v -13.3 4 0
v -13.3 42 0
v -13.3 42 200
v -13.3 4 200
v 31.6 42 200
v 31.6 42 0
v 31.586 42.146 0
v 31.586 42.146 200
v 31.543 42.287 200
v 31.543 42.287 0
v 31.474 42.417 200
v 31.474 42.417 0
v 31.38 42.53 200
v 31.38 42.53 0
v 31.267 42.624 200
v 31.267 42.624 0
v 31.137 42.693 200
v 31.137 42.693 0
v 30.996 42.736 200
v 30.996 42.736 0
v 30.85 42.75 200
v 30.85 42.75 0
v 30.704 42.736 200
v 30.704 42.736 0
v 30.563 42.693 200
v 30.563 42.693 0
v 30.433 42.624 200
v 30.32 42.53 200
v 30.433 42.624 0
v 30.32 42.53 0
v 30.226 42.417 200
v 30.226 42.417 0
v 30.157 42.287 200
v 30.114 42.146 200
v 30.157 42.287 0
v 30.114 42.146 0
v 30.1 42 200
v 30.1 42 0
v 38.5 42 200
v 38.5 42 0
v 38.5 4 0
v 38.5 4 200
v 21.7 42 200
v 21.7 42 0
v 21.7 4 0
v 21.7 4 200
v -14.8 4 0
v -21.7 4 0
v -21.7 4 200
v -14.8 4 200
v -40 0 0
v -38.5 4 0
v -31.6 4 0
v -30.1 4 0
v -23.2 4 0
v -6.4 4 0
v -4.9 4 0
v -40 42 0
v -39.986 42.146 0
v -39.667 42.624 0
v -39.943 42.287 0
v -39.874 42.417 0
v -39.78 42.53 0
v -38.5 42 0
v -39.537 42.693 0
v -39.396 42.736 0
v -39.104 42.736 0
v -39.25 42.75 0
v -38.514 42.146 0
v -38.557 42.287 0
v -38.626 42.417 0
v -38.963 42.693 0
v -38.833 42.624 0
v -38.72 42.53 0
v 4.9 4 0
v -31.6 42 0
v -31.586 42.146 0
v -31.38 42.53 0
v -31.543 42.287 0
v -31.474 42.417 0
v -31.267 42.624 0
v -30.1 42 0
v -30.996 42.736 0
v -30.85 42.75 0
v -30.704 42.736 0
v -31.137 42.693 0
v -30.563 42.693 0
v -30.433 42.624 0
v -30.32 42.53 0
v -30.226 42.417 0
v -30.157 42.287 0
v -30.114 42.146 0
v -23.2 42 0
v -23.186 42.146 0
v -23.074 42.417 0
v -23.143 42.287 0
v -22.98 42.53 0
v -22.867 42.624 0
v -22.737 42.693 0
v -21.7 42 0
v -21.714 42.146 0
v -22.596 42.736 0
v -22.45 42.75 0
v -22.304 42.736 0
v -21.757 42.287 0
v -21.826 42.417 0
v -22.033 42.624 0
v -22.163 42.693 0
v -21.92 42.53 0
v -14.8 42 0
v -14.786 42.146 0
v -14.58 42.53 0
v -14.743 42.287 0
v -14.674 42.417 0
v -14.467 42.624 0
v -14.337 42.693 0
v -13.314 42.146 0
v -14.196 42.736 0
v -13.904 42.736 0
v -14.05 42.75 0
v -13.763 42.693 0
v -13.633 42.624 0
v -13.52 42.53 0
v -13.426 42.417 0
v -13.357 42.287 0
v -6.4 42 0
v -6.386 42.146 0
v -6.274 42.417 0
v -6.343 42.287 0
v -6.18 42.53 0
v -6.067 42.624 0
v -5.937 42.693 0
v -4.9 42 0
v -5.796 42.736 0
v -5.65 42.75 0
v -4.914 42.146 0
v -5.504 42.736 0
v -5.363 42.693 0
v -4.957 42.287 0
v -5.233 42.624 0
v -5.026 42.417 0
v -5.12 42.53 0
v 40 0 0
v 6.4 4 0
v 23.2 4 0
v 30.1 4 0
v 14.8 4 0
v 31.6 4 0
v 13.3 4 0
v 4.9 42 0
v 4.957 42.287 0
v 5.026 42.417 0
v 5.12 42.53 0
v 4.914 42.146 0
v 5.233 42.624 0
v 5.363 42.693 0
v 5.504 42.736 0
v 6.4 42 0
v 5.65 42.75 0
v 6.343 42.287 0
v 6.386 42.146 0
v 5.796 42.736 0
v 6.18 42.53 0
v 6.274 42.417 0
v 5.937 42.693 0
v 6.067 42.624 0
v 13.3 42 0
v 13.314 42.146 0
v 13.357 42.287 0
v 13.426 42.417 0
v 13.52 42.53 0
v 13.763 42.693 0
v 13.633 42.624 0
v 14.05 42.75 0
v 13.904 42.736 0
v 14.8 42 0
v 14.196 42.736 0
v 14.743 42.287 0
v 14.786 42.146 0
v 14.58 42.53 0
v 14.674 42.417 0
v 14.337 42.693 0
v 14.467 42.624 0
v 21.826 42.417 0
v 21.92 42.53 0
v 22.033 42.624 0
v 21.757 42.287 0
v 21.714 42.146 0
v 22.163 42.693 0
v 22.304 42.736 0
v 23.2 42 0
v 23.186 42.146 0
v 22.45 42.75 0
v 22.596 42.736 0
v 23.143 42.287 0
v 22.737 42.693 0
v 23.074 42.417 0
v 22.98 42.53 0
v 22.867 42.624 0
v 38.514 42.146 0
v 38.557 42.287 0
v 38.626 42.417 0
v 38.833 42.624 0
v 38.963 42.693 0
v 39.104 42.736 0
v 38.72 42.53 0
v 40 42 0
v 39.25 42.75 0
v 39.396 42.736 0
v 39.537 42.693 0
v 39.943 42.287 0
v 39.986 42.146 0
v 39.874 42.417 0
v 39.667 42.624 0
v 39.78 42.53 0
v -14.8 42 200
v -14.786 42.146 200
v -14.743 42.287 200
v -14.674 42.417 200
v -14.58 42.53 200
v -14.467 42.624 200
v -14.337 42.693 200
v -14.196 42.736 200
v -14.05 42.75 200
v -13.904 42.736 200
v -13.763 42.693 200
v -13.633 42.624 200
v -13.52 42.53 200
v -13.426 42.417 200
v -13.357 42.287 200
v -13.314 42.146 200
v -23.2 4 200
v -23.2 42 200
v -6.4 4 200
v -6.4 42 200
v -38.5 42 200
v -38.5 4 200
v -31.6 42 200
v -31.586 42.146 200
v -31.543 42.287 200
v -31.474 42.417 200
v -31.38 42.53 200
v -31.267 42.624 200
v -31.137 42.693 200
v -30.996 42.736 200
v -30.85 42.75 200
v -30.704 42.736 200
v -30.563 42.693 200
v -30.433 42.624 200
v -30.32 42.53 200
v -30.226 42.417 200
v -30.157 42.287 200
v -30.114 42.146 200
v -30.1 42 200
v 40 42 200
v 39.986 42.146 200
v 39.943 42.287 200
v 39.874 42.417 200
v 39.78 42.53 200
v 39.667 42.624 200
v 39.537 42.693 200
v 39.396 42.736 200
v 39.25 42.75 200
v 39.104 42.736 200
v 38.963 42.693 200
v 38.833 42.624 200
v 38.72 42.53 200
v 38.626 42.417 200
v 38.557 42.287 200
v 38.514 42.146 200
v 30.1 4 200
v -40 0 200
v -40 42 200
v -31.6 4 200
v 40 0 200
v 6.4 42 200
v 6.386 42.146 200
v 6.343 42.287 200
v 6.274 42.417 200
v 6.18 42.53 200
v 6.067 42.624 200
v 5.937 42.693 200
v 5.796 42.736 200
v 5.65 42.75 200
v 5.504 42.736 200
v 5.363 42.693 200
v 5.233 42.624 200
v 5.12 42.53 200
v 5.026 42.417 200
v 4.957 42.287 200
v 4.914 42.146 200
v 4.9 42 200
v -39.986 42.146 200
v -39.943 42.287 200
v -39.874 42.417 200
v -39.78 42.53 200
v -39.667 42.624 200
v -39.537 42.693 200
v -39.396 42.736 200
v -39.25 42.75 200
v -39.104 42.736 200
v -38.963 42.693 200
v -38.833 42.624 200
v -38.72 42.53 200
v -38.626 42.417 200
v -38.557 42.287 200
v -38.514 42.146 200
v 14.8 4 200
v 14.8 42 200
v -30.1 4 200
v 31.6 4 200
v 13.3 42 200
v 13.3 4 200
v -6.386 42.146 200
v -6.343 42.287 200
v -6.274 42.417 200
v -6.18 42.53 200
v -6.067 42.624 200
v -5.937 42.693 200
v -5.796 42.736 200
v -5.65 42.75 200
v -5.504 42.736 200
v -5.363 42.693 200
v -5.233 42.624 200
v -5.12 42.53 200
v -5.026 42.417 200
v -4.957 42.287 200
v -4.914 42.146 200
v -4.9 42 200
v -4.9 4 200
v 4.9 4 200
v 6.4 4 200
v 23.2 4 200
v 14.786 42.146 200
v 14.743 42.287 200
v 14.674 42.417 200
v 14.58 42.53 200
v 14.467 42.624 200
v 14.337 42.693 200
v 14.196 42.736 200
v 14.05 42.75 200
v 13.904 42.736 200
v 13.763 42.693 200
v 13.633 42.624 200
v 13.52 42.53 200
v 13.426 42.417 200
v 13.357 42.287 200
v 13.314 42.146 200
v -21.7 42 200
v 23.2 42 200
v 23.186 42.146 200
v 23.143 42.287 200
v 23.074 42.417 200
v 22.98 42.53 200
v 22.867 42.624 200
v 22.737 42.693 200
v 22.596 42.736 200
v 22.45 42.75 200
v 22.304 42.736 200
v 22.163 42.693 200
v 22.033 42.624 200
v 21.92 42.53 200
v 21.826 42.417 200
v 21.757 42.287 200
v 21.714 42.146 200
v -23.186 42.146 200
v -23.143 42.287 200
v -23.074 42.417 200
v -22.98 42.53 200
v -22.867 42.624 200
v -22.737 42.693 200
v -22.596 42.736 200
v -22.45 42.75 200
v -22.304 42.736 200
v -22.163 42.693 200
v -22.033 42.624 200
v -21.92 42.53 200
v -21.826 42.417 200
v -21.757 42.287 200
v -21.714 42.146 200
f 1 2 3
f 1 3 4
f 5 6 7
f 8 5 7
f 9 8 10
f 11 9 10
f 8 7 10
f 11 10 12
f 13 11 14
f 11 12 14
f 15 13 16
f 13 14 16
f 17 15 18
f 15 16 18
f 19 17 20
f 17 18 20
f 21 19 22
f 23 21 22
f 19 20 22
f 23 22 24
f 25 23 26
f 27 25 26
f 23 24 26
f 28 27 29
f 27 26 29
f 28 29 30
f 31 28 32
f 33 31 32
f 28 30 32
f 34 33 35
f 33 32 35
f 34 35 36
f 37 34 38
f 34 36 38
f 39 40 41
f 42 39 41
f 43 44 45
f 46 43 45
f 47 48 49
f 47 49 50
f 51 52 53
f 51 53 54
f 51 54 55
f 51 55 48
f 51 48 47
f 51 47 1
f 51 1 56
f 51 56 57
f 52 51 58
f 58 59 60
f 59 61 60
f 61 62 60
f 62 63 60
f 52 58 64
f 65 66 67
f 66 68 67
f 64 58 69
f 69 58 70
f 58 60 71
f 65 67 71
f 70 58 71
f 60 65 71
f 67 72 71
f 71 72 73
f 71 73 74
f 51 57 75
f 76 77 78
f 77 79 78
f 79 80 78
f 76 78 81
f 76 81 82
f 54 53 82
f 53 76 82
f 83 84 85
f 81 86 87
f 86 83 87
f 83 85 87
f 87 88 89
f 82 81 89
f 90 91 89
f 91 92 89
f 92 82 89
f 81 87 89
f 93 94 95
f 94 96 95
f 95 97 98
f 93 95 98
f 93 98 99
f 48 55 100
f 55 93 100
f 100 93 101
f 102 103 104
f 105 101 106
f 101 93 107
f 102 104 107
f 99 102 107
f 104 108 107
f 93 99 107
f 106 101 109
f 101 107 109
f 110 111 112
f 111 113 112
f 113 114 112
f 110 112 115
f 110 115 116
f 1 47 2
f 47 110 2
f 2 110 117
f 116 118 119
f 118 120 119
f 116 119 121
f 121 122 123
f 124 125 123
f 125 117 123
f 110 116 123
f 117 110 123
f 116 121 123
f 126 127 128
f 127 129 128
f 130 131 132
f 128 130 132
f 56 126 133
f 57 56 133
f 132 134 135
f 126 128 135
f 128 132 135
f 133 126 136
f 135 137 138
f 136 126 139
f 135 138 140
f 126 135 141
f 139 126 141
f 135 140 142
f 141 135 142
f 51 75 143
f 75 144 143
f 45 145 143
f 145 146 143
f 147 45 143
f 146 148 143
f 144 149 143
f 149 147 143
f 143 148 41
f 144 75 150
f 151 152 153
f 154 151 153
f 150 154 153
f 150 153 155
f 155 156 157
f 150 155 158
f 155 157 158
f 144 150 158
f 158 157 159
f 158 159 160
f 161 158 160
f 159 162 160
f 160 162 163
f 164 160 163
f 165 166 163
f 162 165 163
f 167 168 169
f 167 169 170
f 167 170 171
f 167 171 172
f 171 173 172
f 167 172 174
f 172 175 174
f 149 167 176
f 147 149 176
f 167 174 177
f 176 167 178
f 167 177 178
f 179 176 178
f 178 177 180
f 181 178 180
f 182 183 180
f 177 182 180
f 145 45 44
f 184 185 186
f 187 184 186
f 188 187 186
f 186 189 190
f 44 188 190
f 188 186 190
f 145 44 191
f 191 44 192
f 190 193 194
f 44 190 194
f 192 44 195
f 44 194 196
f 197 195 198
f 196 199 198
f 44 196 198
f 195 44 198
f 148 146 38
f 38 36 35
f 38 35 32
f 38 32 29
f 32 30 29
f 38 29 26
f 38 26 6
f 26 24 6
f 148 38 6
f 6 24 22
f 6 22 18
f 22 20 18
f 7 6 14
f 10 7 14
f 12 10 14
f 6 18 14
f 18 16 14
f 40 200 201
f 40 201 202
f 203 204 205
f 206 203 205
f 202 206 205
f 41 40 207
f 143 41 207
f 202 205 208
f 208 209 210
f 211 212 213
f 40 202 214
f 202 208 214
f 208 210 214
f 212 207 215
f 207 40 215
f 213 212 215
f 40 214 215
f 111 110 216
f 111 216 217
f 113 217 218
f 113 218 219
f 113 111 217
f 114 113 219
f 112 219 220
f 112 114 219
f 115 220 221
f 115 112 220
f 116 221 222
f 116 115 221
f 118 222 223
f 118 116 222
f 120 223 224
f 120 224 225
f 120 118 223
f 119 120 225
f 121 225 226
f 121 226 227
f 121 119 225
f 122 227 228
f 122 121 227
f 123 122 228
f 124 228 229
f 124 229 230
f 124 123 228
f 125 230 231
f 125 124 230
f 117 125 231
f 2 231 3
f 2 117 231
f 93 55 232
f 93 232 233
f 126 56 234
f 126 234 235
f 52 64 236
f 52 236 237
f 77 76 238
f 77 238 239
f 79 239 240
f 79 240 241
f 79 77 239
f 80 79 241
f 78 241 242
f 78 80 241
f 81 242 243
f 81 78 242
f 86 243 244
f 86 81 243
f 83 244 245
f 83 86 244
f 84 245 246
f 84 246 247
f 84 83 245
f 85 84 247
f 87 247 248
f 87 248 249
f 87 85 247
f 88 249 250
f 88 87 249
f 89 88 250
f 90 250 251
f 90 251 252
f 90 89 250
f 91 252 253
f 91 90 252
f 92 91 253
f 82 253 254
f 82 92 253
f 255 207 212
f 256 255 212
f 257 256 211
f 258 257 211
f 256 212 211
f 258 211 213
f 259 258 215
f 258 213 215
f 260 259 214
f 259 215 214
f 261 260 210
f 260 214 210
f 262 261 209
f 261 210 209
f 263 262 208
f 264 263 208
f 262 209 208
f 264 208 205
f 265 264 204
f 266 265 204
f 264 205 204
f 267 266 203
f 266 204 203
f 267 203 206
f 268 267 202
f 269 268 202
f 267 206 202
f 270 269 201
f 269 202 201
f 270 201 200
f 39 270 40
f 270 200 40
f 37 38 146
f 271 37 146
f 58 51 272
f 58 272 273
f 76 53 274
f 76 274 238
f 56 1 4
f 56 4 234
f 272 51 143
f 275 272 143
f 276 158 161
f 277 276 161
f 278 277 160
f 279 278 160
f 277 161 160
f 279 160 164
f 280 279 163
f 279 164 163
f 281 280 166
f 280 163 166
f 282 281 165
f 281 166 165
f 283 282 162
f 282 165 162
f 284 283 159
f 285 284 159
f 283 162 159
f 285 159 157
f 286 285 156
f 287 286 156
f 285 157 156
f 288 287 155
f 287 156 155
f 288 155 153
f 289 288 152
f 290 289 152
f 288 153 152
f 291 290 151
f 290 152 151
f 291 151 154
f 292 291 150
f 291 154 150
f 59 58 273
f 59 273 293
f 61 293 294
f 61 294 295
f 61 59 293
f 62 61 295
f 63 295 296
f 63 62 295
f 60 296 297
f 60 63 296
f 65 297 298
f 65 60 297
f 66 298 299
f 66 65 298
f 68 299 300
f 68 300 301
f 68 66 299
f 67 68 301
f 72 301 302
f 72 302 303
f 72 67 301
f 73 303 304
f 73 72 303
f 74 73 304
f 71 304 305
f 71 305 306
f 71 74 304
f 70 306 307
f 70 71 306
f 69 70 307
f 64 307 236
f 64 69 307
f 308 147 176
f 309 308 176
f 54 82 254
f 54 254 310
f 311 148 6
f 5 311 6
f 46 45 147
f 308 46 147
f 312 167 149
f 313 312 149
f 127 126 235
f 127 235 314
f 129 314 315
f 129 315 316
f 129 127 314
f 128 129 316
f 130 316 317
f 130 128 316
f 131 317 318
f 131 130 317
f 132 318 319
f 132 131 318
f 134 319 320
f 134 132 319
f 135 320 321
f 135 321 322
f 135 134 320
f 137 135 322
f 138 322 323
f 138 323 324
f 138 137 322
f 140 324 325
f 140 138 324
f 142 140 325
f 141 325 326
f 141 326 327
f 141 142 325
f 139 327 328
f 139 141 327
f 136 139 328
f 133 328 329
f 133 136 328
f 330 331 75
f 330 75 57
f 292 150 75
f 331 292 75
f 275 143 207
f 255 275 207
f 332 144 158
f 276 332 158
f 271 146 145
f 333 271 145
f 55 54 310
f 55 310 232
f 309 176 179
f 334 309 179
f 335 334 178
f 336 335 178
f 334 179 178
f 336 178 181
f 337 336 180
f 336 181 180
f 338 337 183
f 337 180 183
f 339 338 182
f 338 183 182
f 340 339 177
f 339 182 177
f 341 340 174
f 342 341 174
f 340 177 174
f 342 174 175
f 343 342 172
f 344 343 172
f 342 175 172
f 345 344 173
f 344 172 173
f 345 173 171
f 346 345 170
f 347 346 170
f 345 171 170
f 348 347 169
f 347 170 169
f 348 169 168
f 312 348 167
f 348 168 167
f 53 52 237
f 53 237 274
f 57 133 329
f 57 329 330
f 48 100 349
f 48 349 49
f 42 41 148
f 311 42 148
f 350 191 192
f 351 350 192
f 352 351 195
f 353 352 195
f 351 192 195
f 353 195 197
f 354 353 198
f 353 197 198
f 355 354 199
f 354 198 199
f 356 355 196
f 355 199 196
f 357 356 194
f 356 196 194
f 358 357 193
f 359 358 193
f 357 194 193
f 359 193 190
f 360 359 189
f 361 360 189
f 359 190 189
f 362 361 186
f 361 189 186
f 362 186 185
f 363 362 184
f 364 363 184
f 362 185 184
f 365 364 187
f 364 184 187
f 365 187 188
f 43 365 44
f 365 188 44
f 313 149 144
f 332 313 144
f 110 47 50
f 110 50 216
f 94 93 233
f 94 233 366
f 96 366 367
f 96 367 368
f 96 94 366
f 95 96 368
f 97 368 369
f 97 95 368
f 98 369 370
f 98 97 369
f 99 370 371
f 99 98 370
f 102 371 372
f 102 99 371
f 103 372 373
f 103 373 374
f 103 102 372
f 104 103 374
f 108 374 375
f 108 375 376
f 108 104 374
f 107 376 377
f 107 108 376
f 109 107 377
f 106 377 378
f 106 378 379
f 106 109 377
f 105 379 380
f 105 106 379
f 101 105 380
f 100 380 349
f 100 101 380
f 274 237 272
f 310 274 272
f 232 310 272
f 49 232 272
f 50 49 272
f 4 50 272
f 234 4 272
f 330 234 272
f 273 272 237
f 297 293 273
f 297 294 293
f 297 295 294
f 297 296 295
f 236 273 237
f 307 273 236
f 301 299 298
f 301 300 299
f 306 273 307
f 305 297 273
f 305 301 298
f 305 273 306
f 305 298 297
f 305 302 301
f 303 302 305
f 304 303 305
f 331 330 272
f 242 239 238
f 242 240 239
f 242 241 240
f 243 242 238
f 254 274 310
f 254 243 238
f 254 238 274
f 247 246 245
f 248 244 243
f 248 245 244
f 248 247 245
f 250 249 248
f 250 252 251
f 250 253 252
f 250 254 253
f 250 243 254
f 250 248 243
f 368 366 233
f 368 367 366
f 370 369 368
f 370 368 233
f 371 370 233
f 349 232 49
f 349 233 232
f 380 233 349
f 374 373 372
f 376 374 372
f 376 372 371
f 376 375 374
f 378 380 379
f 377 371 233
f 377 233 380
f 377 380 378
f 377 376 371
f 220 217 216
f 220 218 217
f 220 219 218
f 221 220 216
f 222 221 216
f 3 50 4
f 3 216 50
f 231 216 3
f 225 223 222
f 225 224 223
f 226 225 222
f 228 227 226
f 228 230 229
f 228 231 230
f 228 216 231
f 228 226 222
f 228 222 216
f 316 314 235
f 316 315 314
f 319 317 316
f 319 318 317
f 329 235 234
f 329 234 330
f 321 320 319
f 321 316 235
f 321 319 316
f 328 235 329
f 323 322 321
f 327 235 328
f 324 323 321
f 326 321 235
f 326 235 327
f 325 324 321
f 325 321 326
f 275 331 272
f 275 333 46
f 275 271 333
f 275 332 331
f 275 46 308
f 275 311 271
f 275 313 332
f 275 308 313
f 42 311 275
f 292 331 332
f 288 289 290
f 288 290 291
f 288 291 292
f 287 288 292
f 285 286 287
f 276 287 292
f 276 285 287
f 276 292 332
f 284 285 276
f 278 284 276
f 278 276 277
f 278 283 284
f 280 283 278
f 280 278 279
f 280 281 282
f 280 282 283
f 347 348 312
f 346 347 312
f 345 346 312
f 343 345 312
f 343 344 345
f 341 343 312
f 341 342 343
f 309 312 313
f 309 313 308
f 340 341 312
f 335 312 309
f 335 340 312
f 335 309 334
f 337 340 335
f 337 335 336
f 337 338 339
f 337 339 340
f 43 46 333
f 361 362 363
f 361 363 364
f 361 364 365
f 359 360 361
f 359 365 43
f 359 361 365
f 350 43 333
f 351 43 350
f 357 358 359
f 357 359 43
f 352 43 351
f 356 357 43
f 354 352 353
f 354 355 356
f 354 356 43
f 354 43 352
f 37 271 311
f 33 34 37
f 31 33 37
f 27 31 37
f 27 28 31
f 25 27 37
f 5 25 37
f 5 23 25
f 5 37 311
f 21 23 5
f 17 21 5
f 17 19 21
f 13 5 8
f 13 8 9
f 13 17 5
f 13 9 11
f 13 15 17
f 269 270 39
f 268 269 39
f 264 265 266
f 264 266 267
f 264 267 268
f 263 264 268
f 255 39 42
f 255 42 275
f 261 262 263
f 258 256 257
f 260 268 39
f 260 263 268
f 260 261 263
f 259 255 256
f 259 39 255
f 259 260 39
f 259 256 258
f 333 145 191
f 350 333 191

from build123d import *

# Parameters (mm, degrees)
SALIENTE_EXTRUIR1_DEPTH = 200
MATRIZL1_COUNT          = 5
MATRIZL1_PITCH          = 8.4
SIMETR_A1_COPY_1_DEPTH  = 200
SIMETR_A1_COPY_2_DEPTH  = 200
SIMETR_A1_COPY_3_DEPTH  = 200
SIMETR_A1_COPY_4_DEPTH  = 200


with BuildPart() as part:
    # Croquis1 → Saliente-Extruir1 (new body)
    with BuildSketch(Plane.XY):
        with BuildLine():
            Line((31.6, 4), (31.6, 0))
            Line((31.6, 0), (40, 0))
            Line((40, 0), (40, 42))
            ThreePointArc((40, 42), (39.25, 42.75), (38.5, 42))
            Line((38.5, 42), (38.5, 4))
            Line((38.5, 4), (31.6, 4))
        make_face()
    saliente_extruir1 = extrude(amount=SALIENTE_EXTRUIR1_DEPTH)

    # MatrizL1: Saliente-Extruir1 ×5
    with Locations(*[(-i * MATRIZL1_PITCH, 0, 0) for i in range(1, MATRIZL1_COUNT)]):
        add(saliente_extruir1)



with BuildPart() as simetr_a1_1:
    # Simetría1: Saliente-Extruir1 across plane
    add(saliente_extruir1.mirror(Plane(origin=(0, 0, 0), x_dir=(0, 0, 1), z_dir=(1, 0, 0))))

    # Simetría1 copy 1 sketch → Simetría1 copy 1 (add)
    with BuildSketch(Plane(origin=(8.4, 0, 0), x_dir=(-1, 0, 0), z_dir=(0, 0, 1))):
        with BuildLine():
            Line((31.6, -4), (31.6, 0))
            Line((31.6, 0), (40, 0))
            Line((40, 0), (40, -42))
            ThreePointArc((40, -42), (39.25, -42.75), (38.5, -42))
            Line((38.5, -42), (38.5, -4))
            Line((38.5, -4), (31.6, -4))
        make_face()
    extrude(amount=SIMETR_A1_COPY_1_DEPTH)

    # Simetría1 copy 2 sketch → Simetría1 copy 2 (add)
    with BuildSketch(Plane(origin=(16.8, 0, 0), x_dir=(-1, 0, 0), z_dir=(0, 0, 1))):
        with BuildLine():
            Line((31.6, -4), (31.6, 0))
            Line((31.6, 0), (40, 0))
            Line((40, 0), (40, -42))
            ThreePointArc((40, -42), (39.25, -42.75), (38.5, -42))
            Line((38.5, -42), (38.5, -4))
            Line((38.5, -4), (31.6, -4))
        make_face()
    extrude(amount=SIMETR_A1_COPY_2_DEPTH)

    # Simetría1 copy 3 sketch → Simetría1 copy 3 (add)
    with BuildSketch(Plane(origin=(25.2, 0, 0), x_dir=(-1, 0, 0), z_dir=(0, 0, 1))):
        with BuildLine():
            Line((31.6, -4), (31.6, 0))
            Line((31.6, 0), (40, 0))
            Line((40, 0), (40, -42))
            ThreePointArc((40, -42), (39.25, -42.75), (38.5, -42))
            Line((38.5, -42), (38.5, -4))
            Line((38.5, -4), (31.6, -4))
        make_face()
    extrude(amount=SIMETR_A1_COPY_3_DEPTH)


with BuildPart() as part_1:
    add(part.part)

    add(simetr_a1_1.part)  # Simetría1 copy 4 merges Simetría1_1
    # Simetría1 copy 4 sketch → Simetría1 copy 4 (add)
    with BuildSketch(Plane(origin=(33.6, 0, 0), x_dir=(-1, 0, 0), z_dir=(0, 0, 1))):
        with BuildLine():
            Line((31.6, -4), (31.6, 0))
            Line((31.6, 0), (40, 0))
            Line((40, 0), (40, -42))
            ThreePointArc((40, -42), (39.25, -42.75), (38.5, -42))
            Line((38.5, -42), (38.5, -4))
            Line((38.5, -4), (31.6, -4))
        make_face()
    extrude(amount=SIMETR_A1_COPY_4_DEPTH)


solid = part_1.part
